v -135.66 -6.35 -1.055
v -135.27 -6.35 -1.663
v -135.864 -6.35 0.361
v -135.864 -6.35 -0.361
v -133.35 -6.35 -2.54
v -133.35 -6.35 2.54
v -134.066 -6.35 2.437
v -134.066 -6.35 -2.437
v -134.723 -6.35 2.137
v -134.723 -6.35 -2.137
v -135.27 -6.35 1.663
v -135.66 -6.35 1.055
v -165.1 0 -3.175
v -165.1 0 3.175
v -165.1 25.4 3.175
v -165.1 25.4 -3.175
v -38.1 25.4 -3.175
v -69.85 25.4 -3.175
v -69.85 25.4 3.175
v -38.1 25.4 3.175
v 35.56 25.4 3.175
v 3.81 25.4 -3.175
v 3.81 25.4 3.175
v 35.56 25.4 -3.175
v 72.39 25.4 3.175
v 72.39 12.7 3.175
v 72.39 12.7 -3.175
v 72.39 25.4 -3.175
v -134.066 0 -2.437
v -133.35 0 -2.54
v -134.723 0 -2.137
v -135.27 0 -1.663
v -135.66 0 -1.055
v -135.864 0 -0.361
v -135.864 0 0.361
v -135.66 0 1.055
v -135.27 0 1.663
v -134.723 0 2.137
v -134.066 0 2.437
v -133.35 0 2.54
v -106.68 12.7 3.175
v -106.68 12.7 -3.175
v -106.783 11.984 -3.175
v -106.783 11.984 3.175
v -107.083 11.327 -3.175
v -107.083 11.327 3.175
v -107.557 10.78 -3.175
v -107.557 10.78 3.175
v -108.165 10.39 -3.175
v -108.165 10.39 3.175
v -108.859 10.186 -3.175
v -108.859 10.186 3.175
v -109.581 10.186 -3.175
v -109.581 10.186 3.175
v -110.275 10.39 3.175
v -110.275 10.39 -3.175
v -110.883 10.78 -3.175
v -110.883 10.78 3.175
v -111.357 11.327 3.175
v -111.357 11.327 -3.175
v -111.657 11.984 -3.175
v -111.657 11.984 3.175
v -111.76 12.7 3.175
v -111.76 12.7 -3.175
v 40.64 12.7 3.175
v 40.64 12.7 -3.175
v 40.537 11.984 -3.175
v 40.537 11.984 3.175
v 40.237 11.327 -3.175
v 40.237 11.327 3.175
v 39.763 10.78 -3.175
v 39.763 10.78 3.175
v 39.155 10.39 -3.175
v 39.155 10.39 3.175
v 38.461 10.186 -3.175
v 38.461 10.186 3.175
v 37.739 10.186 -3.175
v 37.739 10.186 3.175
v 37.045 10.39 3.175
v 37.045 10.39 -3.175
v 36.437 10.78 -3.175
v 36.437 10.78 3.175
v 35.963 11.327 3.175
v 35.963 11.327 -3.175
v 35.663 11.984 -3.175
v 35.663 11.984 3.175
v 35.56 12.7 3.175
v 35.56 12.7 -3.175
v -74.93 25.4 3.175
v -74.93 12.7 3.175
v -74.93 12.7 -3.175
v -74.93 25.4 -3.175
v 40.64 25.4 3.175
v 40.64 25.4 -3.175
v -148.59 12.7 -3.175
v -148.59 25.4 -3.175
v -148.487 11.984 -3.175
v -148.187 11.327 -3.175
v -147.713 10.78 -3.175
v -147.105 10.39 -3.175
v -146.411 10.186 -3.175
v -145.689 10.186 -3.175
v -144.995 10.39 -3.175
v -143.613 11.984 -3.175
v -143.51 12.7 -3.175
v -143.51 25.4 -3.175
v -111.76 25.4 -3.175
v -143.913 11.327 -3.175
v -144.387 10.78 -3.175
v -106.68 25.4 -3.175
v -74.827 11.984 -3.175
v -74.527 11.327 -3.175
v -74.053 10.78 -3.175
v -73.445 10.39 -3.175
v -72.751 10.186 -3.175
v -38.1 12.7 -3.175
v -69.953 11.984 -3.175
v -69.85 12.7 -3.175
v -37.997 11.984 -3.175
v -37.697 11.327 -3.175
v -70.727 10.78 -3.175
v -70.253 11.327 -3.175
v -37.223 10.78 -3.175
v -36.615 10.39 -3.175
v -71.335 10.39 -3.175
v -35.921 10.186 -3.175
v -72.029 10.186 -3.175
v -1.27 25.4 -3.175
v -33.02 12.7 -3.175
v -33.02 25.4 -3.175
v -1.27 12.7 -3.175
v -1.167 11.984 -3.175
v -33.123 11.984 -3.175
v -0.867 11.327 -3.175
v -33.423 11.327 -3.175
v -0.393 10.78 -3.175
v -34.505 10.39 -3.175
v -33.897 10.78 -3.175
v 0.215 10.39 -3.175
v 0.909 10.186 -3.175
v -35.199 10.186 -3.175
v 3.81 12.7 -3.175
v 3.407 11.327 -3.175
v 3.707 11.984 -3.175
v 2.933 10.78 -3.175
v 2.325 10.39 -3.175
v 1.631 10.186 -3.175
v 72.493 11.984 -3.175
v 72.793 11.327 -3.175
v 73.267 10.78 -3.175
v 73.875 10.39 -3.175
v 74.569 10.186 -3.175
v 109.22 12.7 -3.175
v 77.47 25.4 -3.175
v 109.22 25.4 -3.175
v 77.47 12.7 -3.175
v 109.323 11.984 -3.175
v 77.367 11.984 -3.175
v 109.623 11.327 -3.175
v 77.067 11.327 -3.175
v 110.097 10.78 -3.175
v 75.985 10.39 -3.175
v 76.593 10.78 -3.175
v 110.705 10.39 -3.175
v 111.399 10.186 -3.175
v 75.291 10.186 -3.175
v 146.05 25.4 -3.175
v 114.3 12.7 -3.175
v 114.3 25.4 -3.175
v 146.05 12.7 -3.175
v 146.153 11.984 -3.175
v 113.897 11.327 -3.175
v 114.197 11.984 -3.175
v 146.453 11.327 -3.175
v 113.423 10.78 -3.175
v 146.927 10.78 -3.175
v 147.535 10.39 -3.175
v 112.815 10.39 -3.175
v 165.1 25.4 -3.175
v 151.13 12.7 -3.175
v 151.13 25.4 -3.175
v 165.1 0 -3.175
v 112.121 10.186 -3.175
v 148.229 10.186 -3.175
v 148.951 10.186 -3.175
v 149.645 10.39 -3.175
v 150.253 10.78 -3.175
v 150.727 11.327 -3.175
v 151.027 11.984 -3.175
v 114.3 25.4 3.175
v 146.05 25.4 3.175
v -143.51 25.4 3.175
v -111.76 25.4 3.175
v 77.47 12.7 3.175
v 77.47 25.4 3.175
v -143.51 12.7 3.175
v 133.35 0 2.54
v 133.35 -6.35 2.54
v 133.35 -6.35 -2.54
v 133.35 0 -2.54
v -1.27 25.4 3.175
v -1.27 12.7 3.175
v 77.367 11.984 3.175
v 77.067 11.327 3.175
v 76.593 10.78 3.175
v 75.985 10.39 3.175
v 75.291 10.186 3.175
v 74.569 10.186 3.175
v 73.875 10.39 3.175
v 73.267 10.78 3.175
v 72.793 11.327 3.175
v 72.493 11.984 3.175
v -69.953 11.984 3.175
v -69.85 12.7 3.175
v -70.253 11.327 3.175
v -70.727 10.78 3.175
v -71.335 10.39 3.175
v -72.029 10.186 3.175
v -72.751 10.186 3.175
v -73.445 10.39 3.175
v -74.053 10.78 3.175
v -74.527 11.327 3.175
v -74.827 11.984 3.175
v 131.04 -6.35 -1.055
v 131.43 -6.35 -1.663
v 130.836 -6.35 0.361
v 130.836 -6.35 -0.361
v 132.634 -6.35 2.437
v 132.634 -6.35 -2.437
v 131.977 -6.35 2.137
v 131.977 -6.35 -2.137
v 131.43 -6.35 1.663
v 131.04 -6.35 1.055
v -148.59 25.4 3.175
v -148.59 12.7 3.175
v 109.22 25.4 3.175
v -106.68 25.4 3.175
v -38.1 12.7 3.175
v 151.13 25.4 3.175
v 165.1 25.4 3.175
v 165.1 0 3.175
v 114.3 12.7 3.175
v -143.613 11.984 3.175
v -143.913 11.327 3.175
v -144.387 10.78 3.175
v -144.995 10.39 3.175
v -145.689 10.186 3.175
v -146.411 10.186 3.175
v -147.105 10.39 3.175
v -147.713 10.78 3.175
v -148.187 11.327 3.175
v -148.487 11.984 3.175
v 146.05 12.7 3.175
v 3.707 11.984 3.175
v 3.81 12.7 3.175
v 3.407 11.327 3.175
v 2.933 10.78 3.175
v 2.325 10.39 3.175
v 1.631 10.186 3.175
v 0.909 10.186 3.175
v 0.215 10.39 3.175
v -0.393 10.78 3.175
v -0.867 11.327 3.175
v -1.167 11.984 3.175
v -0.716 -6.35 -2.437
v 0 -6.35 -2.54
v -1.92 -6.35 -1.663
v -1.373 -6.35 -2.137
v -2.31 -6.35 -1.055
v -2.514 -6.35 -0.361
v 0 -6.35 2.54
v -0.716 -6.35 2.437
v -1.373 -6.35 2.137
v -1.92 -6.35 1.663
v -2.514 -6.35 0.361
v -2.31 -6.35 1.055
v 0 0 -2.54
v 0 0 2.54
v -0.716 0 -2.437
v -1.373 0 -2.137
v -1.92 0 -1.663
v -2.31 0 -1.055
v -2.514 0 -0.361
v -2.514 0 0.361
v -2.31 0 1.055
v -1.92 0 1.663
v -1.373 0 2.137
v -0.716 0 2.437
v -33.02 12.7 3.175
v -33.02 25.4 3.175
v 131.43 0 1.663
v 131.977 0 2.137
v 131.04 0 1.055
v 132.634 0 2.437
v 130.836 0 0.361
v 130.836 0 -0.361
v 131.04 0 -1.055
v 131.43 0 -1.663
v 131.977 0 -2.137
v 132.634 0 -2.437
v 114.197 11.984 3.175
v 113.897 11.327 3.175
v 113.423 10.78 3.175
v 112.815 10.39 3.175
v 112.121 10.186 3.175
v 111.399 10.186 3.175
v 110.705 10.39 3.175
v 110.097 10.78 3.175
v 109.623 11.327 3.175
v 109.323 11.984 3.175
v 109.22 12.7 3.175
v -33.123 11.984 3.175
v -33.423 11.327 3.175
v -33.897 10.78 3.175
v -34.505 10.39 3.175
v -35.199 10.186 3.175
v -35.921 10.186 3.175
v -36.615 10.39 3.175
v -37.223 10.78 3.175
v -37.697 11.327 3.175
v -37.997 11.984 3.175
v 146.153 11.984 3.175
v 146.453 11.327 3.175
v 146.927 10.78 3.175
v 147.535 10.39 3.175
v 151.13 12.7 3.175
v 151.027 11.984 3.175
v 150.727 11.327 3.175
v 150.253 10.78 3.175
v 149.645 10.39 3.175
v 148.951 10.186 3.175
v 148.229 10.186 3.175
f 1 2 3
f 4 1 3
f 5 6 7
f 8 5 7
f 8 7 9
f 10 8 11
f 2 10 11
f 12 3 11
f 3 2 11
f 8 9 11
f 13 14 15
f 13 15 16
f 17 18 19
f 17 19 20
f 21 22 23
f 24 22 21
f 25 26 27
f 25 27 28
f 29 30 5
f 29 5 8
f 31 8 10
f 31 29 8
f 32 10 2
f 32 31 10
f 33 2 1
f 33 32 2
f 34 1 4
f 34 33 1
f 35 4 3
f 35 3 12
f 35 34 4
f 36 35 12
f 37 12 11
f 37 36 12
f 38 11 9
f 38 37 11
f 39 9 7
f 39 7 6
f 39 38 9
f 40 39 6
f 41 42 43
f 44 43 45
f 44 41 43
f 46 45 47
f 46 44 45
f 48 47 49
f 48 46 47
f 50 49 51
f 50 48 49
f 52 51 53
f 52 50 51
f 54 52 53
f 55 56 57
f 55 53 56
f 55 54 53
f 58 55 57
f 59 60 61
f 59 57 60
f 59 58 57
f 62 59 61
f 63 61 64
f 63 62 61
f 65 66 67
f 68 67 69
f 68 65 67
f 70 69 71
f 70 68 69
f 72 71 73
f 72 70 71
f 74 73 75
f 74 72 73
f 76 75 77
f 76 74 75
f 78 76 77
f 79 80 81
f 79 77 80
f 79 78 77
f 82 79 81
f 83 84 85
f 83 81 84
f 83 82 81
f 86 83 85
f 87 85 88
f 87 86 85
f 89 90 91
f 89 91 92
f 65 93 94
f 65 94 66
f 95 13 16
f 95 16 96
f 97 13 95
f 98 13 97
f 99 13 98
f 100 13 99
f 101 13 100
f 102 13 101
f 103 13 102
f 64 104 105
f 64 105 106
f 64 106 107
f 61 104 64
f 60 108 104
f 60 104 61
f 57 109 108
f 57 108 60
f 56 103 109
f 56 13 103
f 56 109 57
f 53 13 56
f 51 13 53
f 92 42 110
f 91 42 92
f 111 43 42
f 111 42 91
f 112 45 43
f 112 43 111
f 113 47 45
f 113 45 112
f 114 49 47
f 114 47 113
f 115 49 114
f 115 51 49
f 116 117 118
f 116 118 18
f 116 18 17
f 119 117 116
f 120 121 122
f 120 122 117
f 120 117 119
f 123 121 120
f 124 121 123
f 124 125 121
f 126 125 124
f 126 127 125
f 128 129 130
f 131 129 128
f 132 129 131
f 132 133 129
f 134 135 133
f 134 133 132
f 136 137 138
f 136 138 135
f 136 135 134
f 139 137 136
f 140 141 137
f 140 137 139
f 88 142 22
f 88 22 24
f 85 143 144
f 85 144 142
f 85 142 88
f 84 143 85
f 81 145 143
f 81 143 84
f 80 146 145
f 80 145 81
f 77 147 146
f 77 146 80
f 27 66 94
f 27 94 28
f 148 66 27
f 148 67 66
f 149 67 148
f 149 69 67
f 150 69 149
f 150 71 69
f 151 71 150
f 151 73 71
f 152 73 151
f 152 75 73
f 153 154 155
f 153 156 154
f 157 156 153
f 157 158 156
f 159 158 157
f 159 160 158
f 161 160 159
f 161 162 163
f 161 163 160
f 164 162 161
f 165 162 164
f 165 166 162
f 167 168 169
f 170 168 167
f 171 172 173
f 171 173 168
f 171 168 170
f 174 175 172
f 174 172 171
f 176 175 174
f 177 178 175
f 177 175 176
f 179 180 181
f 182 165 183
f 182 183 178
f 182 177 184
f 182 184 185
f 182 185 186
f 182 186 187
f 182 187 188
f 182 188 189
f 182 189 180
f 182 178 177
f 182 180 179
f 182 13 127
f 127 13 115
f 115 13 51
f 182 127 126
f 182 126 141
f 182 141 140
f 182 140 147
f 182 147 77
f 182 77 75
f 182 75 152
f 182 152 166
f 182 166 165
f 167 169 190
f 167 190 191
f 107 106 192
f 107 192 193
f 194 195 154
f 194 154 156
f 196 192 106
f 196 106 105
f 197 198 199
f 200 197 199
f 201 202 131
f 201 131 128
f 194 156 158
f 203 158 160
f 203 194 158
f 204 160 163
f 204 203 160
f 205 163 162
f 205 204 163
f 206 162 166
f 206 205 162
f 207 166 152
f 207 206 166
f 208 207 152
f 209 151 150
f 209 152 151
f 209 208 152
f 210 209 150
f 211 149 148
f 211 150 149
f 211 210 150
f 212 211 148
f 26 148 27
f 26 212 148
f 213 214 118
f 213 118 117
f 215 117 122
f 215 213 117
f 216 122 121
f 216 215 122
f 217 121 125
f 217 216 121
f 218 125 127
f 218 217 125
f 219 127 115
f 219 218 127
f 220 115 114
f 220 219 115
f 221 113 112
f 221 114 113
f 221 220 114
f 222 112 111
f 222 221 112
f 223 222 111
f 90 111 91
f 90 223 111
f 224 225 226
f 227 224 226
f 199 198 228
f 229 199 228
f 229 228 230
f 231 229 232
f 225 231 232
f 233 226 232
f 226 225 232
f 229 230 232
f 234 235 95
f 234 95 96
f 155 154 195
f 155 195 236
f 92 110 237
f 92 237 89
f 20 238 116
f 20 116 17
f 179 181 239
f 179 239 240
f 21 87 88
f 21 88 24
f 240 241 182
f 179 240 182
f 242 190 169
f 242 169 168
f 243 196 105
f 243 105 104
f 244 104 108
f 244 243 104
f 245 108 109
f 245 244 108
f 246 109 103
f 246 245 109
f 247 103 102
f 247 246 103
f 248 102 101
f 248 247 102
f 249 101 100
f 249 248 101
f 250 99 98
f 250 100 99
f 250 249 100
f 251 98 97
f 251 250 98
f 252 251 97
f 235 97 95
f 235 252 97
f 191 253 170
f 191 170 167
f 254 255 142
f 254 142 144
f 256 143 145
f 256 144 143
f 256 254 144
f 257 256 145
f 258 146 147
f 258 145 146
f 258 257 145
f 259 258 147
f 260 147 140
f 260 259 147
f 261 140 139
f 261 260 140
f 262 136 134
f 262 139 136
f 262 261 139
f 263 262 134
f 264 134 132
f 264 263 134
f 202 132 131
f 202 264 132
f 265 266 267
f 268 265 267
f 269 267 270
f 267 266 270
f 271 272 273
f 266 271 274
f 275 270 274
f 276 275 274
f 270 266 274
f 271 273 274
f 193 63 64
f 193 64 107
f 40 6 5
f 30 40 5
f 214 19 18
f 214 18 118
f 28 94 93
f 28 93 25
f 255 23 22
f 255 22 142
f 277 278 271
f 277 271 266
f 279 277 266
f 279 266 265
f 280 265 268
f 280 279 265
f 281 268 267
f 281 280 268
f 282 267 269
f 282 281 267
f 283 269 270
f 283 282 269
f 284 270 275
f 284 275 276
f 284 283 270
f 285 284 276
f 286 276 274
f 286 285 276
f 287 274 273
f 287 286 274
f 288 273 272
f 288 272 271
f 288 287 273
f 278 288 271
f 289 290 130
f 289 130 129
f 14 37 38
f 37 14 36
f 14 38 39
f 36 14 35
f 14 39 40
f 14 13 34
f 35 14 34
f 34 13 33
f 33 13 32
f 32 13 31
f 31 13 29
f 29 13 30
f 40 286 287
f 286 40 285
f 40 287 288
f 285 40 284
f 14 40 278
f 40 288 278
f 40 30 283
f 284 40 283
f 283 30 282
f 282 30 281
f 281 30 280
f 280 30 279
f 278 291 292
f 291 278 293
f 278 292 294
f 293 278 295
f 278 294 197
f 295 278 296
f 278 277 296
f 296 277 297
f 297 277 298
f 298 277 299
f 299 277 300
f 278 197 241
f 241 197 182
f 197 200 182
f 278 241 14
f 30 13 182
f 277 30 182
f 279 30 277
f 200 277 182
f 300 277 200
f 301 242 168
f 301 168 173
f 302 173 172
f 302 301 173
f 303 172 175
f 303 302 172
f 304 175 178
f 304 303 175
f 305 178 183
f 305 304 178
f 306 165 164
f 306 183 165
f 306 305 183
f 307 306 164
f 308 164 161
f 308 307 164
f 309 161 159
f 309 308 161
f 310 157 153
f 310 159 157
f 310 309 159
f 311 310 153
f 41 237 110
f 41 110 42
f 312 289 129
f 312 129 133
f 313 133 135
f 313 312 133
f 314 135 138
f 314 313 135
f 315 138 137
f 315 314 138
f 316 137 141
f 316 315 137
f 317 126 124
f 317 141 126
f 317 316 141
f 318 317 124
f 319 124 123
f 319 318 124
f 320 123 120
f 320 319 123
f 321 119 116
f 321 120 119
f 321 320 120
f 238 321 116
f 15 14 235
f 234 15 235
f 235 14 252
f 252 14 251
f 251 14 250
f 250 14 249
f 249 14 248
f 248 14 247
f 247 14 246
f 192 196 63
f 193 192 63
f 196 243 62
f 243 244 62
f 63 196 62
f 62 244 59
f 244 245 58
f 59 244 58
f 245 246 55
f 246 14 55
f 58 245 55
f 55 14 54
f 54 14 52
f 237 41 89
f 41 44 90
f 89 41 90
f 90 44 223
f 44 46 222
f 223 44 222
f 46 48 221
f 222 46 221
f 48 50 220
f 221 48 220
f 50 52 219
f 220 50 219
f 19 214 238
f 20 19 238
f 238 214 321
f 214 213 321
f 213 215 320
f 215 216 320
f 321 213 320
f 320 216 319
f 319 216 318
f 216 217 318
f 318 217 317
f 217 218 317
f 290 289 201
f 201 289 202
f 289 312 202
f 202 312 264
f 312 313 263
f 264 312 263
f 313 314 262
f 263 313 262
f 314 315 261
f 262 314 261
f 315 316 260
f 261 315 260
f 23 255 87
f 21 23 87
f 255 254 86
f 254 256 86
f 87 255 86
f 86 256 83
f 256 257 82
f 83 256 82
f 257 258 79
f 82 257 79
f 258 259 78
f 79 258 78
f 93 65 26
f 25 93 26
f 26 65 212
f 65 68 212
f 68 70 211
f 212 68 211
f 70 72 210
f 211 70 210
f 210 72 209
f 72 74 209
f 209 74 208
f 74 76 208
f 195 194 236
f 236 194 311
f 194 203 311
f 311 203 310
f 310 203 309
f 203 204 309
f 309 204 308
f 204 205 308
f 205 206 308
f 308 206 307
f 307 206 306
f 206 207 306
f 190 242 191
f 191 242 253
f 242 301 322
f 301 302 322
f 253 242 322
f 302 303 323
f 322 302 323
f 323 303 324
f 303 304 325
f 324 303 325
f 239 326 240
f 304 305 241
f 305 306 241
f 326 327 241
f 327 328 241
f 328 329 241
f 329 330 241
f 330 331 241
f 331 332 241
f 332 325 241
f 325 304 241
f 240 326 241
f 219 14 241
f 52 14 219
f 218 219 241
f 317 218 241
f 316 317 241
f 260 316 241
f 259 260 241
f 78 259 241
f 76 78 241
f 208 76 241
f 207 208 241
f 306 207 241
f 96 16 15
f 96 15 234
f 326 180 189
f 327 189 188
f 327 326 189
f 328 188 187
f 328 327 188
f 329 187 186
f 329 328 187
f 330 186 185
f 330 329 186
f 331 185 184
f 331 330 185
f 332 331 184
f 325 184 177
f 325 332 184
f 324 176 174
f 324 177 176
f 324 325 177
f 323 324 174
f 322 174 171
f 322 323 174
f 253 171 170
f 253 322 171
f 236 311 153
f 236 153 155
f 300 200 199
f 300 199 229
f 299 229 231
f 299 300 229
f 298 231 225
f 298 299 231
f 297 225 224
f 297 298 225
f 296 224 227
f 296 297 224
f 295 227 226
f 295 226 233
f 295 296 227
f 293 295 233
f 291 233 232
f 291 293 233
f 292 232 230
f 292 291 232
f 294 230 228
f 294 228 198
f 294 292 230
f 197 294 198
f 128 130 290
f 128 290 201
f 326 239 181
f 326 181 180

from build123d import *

# Parameters (mm, degrees)
SKETCH1_W           = 330.2
SKETCH1_H           = 6.35
BOSS_EXTRUDE1_DEPTH = 25.4
BOSS_EXTRUDE2_DEPTH = 6.35
CUT_EXTRUDE1_DEPTH  = 168.16307158


with BuildPart() as part:
    # Sketch1 → Boss-Extrude1 (new body)
    with BuildSketch(Plane(origin=(0, 0, 0), x_dir=(1, 0, 0), z_dir=(0, 1, 0))):
        Rectangle(SKETCH1_W, SKETCH1_H)
    extrude(amount=BOSS_EXTRUDE1_DEPTH)

    # Sketch2 → Boss-Extrude2 (add)
    with BuildSketch(Plane.XZ):
        with BuildLine():
            Line((-133.35, 2.54), (-133.35, -2.54))
            ThreePointArc((-133.35, -2.54), (-135.89, 0), (-133.35, 2.54))
        make_face()
        with BuildLine():
            Line((0, 2.54), (0, -2.54))
            ThreePointArc((0, -2.54), (-2.54, 0), (0, 2.54))
        make_face()
        with BuildLine():
            Line((133.35, 2.54), (133.35, -2.54))
            ThreePointArc((133.35, -2.54), (130.81, 0), (133.35, 2.54))
        make_face()
    extrude(amount=BOSS_EXTRUDE2_DEPTH)

    # Sketch3 → Cut-Extrude1 (cut, through all)
    with BuildSketch(Plane.XY.offset(3.175)):
        with BuildLine():
            Line((-143.51, 38.1), (-143.51, 12.7))
            ThreePointArc((-143.51, 12.7), (-146.05, 10.16), (-148.59, 12.7))
            Line((-148.59, 12.7), (-148.59, 38.1))
            ThreePointArc((-148.59, 38.1), (-146.05, 40.64), (-143.51, 38.1))
        make_face()
        with BuildLine():
            Line((-106.68, 38.1), (-106.68, 12.7))
            ThreePointArc((-106.68, 12.7), (-109.22, 10.16), (-111.76, 12.7))
            Line((-111.76, 12.7), (-111.76, 38.1))
            ThreePointArc((-111.76, 38.1), (-109.22, 40.64), (-106.68, 38.1))
        make_face()
        with BuildLine():
            Line((-69.85, 38.1), (-69.85, 12.7))
            ThreePointArc((-69.85, 12.7), (-72.39, 10.16), (-74.93, 12.7))
            Line((-74.93, 12.7), (-74.93, 38.1))
            ThreePointArc((-74.93, 38.1), (-72.39, 40.64), (-69.85, 38.1))
        make_face()
        with BuildLine():
            Line((-33.02, 38.1), (-33.02, 12.7))
            ThreePointArc((-33.02, 12.7), (-35.56, 10.16), (-38.1, 12.7))
            Line((-38.1, 12.7), (-38.1, 38.1))
            ThreePointArc((-38.1, 38.1), (-35.56, 40.64), (-33.02, 38.1))
        make_face()
        with BuildLine():
            Line((3.81, 38.1), (3.81, 12.7))
            ThreePointArc((3.81, 12.7), (1.27, 10.16), (-1.27, 12.7))
            Line((-1.27, 12.7), (-1.27, 38.1))
            ThreePointArc((-1.27, 38.1), (1.27, 40.64), (3.81, 38.1))
        make_face()
        with BuildLine():
            Line((40.64, 38.1), (40.64, 12.7))
            ThreePointArc((40.64, 12.7), (38.1, 10.16), (35.56, 12.7))
            Line((35.56, 12.7), (35.56, 38.1))
            ThreePointArc((35.56, 38.1), (38.1, 40.64), (40.64, 38.1))
        make_face()
        with BuildLine():
            Line((77.47, 38.1), (77.47, 12.7))
            ThreePointArc((77.47, 12.7), (74.93, 10.16), (72.39, 12.7))
            Line((72.39, 12.7), (72.39, 38.1))
            ThreePointArc((72.39, 38.1), (74.93, 40.64), (77.47, 38.1))
        make_face()
        with BuildLine():
            Line((114.3, 38.1), (114.3, 12.7))
            ThreePointArc((114.3, 12.7), (111.76, 10.16), (109.22, 12.7))
            Line((109.22, 12.7), (109.22, 38.1))
            ThreePointArc((109.22, 38.1), (111.76, 40.64), (114.3, 38.1))
        make_face()
        with BuildLine():
            Line((151.13, 38.1), (151.13, 12.7))
            ThreePointArc((151.13, 12.7), (148.59, 10.16), (146.05, 12.7))
            Line((146.05, 12.7), (146.05, 38.1))
            ThreePointArc((146.05, 38.1), (148.59, 40.64), (151.13, 38.1))
        make_face()
    extrude(amount=-CUT_EXTRUDE1_DEPTH, mode=Mode.SUBTRACT)


solid = part.part
